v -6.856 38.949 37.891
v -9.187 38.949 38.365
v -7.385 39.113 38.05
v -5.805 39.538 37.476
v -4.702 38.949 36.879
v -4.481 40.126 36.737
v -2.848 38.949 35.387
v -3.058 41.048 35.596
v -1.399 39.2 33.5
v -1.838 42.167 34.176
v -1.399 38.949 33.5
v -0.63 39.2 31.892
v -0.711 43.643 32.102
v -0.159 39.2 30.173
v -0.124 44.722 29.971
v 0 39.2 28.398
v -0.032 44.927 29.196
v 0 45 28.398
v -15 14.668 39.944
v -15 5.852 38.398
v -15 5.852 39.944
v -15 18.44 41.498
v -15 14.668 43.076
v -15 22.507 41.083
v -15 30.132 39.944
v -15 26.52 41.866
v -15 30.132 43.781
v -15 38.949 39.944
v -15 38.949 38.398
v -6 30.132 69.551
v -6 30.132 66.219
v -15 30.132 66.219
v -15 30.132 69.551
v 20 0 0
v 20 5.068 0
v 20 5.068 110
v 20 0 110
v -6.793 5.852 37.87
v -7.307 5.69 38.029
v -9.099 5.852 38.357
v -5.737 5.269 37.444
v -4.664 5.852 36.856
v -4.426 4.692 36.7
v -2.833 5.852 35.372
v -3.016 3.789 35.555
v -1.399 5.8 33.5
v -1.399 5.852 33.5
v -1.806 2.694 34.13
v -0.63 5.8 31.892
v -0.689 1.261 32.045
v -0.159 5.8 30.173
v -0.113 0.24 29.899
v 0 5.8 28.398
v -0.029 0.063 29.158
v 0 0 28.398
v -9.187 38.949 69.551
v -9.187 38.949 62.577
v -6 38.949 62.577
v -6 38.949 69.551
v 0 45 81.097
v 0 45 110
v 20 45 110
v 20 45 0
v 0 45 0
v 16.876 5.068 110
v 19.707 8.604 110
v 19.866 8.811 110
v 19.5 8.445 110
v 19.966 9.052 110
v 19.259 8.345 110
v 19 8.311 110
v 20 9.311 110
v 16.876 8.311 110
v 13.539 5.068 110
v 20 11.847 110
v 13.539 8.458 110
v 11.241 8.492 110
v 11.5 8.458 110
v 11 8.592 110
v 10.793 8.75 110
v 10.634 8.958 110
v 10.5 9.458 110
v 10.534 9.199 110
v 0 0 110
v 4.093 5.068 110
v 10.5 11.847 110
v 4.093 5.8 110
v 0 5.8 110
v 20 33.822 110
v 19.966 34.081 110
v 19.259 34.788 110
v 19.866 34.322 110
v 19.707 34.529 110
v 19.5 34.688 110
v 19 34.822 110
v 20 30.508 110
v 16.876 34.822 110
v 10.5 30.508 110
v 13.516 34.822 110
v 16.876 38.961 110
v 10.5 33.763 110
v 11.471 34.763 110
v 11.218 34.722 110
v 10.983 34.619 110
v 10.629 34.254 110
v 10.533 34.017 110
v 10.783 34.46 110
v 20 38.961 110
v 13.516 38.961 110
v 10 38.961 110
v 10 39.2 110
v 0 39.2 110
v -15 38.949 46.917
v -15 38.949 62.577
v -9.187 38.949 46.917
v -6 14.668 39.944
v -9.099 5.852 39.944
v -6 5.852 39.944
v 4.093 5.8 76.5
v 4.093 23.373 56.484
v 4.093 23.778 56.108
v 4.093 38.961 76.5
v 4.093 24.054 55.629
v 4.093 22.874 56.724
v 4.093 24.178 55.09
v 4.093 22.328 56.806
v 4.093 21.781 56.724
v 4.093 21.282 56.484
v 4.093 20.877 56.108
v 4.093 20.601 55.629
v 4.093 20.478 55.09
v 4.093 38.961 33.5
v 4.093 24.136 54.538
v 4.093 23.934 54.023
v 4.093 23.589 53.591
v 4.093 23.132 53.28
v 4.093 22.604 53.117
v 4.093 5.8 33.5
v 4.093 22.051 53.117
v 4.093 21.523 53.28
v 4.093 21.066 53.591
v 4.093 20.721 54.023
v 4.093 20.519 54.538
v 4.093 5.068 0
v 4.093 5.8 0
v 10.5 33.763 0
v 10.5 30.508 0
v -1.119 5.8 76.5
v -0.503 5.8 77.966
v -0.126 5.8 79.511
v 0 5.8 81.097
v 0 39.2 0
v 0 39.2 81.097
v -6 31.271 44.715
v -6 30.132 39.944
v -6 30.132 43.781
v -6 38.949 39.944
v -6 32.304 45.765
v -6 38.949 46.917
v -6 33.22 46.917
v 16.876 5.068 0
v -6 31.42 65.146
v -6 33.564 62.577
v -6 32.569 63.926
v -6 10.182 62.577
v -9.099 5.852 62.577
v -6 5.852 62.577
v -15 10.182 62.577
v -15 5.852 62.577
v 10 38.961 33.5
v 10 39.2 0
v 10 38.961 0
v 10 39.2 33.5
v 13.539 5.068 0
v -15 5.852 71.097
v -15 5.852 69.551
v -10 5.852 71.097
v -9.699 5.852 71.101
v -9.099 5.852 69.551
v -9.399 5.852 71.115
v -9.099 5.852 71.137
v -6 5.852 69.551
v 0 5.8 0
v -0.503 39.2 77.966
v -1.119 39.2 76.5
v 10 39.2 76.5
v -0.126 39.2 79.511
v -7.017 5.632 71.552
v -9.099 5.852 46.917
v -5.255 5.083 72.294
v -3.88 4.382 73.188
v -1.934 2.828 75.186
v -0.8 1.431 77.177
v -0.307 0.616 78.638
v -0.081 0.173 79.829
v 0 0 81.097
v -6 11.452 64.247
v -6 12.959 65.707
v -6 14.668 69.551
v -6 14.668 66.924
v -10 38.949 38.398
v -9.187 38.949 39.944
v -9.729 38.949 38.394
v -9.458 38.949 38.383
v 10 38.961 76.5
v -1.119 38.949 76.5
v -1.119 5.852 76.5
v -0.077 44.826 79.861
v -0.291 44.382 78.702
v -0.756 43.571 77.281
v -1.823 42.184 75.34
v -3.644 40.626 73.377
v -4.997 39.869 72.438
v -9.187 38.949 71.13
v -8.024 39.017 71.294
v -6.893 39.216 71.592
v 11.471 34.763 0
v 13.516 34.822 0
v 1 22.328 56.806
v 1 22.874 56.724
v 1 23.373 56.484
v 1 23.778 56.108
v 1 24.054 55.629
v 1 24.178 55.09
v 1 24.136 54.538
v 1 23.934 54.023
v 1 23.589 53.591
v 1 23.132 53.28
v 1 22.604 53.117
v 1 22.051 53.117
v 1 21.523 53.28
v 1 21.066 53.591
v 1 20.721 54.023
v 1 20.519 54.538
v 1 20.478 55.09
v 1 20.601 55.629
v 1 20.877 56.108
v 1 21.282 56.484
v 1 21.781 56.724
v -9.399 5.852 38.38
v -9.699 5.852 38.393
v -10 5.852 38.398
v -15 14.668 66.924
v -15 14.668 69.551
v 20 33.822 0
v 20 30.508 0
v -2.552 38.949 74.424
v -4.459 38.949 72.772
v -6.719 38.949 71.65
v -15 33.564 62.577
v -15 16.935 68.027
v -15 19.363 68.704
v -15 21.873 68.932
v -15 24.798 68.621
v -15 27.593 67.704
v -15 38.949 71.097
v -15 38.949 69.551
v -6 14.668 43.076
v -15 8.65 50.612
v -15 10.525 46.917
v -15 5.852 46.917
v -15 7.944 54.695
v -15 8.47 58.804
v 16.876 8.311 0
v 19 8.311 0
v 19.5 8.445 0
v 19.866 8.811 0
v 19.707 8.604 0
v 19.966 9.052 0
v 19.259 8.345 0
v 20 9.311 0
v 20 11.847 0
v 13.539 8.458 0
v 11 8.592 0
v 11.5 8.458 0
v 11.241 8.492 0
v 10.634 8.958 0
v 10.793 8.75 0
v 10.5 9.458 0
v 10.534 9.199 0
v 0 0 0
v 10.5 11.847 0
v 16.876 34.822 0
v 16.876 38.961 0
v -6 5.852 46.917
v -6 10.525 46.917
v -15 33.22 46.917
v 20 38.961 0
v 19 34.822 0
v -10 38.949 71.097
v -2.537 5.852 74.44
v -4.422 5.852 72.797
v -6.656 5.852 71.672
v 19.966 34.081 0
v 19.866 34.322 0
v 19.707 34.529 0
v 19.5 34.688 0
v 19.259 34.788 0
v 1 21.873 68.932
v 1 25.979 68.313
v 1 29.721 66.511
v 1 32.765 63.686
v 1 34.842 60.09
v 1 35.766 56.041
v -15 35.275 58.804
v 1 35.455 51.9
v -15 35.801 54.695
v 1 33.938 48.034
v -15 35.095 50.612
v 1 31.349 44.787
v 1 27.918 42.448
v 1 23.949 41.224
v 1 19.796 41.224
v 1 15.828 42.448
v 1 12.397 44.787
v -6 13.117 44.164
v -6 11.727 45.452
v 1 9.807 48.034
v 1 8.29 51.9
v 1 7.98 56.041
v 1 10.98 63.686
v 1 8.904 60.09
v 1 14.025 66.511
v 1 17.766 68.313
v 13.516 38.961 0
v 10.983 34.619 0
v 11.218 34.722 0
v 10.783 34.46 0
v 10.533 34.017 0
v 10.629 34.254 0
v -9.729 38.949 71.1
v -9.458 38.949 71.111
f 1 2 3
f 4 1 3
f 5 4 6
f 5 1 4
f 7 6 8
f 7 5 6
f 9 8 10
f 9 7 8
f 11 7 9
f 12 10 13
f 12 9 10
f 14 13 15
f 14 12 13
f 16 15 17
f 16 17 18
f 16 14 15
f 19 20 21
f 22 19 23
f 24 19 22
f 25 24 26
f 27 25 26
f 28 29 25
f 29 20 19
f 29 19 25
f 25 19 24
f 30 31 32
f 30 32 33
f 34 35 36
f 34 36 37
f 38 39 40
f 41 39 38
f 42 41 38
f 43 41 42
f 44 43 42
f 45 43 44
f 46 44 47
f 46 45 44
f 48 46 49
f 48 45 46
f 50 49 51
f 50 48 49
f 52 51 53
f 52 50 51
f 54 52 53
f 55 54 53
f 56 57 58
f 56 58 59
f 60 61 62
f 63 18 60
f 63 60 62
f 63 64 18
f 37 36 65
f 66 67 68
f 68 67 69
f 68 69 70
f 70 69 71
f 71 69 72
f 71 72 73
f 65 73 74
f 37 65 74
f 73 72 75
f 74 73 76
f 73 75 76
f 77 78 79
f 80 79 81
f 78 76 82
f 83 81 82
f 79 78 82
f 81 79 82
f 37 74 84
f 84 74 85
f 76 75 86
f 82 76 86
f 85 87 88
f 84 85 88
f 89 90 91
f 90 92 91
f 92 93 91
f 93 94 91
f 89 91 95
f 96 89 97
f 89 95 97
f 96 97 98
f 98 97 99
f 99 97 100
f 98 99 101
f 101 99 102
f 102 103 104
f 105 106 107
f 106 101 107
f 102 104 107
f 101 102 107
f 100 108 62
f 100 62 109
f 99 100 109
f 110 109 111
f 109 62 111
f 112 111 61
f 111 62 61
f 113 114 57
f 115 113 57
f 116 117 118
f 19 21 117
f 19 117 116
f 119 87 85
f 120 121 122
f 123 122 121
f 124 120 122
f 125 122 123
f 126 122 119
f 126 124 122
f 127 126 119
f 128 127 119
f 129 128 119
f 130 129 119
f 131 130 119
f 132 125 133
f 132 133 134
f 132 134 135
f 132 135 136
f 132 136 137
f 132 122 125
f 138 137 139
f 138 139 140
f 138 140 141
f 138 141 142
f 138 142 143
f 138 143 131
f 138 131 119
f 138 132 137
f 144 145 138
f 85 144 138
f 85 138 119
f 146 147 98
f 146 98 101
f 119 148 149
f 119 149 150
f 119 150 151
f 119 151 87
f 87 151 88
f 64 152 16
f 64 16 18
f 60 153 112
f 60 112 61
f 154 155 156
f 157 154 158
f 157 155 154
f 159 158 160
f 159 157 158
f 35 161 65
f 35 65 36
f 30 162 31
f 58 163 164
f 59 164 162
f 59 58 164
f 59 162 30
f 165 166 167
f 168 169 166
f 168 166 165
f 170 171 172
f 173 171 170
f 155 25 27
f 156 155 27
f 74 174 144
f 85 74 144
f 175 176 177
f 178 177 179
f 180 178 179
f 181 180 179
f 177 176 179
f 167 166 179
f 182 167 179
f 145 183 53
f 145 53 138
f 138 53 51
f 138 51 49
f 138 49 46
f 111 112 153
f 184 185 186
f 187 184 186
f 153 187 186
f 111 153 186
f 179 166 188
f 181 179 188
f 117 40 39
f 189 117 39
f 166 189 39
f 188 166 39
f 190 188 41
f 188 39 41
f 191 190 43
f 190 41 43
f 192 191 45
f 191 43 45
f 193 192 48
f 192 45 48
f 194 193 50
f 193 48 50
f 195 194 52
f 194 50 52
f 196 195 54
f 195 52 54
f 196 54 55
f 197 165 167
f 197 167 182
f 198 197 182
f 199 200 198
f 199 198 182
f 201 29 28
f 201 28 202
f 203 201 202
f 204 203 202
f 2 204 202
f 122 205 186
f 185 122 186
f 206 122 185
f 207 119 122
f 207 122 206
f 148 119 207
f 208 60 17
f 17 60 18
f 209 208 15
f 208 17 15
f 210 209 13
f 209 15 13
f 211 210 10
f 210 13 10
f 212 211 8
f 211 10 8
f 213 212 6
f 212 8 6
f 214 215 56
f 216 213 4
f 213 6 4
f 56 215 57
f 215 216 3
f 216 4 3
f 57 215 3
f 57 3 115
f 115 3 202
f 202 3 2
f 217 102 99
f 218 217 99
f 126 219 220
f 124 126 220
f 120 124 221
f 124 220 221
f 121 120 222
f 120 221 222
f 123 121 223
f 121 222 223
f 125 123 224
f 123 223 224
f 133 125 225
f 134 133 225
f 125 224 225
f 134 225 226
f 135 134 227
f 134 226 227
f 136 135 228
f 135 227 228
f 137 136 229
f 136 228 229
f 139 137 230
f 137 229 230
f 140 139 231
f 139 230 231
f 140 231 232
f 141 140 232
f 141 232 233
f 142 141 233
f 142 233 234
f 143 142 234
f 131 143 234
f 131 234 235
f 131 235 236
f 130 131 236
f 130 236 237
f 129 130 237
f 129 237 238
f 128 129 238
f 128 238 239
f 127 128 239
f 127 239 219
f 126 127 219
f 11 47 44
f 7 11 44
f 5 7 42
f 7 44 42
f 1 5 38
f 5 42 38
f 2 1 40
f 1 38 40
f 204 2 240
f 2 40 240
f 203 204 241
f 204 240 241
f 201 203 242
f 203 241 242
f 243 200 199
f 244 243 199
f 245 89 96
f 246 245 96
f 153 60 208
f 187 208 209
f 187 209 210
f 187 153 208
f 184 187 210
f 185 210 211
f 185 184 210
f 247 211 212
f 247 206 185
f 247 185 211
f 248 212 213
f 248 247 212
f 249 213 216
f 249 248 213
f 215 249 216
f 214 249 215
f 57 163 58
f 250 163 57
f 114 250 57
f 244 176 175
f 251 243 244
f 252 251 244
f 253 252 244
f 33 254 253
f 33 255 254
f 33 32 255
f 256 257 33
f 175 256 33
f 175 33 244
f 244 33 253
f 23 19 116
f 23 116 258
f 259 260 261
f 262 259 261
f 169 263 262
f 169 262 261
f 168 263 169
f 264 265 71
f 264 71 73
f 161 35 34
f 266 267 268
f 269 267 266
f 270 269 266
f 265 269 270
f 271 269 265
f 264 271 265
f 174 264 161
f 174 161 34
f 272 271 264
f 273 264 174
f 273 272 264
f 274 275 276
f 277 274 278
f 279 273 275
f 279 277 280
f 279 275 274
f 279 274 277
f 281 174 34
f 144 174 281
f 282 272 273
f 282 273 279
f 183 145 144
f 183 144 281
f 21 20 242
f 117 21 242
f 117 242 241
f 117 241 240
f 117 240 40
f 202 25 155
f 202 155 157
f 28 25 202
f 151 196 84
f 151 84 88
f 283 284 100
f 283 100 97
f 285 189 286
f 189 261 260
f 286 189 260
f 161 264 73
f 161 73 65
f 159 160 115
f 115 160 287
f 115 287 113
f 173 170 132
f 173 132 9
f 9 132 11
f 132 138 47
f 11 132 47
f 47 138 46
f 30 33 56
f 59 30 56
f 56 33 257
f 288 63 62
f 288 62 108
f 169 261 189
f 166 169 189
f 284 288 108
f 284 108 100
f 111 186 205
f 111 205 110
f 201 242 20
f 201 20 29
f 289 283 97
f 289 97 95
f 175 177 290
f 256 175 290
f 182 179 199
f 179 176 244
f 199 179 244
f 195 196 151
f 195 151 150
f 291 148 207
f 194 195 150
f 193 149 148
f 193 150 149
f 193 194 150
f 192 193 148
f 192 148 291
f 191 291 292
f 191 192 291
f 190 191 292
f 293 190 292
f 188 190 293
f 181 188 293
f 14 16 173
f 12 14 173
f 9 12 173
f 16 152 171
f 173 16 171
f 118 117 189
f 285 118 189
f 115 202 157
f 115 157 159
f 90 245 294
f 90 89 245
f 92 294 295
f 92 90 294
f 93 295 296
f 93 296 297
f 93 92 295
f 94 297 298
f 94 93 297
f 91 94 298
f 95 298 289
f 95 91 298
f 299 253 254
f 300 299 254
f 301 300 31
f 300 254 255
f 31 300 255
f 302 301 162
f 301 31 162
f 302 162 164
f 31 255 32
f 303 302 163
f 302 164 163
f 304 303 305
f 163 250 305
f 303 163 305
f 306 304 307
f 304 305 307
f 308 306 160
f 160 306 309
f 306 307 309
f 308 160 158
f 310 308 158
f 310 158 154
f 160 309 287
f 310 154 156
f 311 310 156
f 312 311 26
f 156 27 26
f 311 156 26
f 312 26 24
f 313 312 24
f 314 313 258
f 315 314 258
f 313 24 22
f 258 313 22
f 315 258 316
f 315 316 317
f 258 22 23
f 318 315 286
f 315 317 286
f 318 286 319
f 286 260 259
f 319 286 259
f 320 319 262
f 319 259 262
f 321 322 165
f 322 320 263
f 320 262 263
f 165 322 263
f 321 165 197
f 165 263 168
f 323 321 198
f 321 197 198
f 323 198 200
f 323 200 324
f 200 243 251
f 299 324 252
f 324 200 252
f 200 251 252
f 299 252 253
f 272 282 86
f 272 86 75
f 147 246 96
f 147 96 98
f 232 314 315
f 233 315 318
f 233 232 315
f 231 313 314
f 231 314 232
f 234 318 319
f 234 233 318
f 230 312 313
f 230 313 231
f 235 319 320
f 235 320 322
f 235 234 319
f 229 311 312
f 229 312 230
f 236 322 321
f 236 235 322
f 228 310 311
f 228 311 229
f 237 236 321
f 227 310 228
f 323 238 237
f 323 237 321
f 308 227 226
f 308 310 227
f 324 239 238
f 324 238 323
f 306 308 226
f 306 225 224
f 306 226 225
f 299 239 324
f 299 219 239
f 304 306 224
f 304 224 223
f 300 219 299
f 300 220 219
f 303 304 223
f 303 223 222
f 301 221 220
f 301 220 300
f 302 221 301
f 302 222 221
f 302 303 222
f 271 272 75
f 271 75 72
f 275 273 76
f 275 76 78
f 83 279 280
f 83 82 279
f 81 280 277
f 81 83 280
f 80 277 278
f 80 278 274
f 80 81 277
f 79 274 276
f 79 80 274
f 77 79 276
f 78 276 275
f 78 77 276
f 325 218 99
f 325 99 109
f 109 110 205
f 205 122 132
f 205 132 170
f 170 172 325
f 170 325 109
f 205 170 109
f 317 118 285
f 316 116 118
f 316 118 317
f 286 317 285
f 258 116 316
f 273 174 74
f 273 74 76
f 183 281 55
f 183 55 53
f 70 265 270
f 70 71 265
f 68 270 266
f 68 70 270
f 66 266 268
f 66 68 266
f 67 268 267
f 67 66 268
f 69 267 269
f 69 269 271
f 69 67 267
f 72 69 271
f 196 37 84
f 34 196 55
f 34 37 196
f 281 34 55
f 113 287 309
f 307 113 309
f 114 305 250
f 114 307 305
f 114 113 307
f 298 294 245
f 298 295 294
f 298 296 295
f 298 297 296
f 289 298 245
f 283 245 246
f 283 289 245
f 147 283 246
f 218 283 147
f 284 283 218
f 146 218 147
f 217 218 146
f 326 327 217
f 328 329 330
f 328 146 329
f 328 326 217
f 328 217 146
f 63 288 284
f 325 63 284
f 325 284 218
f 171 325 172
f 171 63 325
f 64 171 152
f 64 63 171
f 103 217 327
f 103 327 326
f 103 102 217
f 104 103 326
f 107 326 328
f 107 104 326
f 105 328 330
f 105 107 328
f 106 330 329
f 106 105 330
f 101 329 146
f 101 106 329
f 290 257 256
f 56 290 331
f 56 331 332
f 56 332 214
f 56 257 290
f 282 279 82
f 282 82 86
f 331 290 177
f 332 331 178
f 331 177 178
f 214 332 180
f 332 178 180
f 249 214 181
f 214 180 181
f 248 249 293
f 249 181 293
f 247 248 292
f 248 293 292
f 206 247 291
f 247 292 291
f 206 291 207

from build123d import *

# Parameters (mm, degrees)
BOSS_EXTRUDE1_DEPTH = 110
SKETCH2_W           = 33.5
SKETCH2_H           = 33.4
CUT_EXTRUDE1_DEPTH  = 10
SKETCH3_R           = 1.855174256
CUT_EXTRUDE3_DEPTH  = 10
SKETCH5_W           = 32.698767502
SKETCH5_H           = 33.097532959
BOSS_EXTRUDE2_DEPTH = 15
FILLET1_START       = 28.397979731
FILLET1_DEPTH       = 52.698767702
FILLET1_START_2     = -6.3183e-05
FILLET1_2_DEPTH     = 45.00011208
FILLET1_START_3     = 5.8
FILLET1_3_DEPTH     = 33.4
FILLET1_START_4     = 5.851542156
FILLET1_4_DEPTH     = 33.097532959
SKETCH6_R           = 13.931881445
CUT_EXTRUDE5_DEPTH  = 16
FILLET7_R           = 1
FILLET8_R           = 1
SKETCH8_W           = 6.973836054
SKETCH8_H           = 8.816669347
CUT_EXTRUDE6_DEPTH  = 9


with BuildPart() as part:
    # Sketch1 → Boss-Extrude1 (new body)
    with BuildSketch(Plane.XY):
        Polygon((0, 0), (0, 45), (20, 45), (20, 38.960548223), (16.876367343, 38.960548223), (16.876367343, 34.822386524), (20, 34.822386524), (20, 30.507676941), (10.5, 30.507676941), (10.5, 34.734112582), (13.516445061, 34.822386524), (13.516445061, 38.960548223), (10.5, 38.960548223), (4.092986166, 38.960548223), (4.092986166, 5.068373594), (10.5, 5.068373594), (13.538820233, 5.068373594), (13.538820233, 8.457591057), (10.5, 8.457591057), (10.5, 11.84680852), (20, 11.84680852), (20, 8.310671744), (16.876367343, 8.310671744), (16.876367343, 5.068373594), (20, 5.068373594), (20, 0), align=None)
    extrude(amount=BOSS_EXTRUDE1_DEPTH)

    # Sketch2 → Cut-Extrude1 (cut)
    with BuildSketch(Plane.ZY):
        with Locations((93.25, 22.5)):
            Rectangle(SKETCH2_W, SKETCH2_H)
        with Locations((16.75, 22.5)):
            Rectangle(SKETCH2_W, SKETCH2_H)
    extrude(amount=-CUT_EXTRUDE1_DEPTH, mode=Mode.SUBTRACT)

    # Sketch3 → Cut-Extrude3 (cut)
    with BuildSketch(Plane.ZY):
        with Locations((54.95102213, 22.327543377)):
            Circle(SKETCH3_R)
    extrude(amount=-CUT_EXTRUDE3_DEPTH, mode=Mode.SUBTRACT)

    # Sketch5 → Boss-Extrude2 (add)
    with BuildSketch(Plane.ZY):
        with Locations((54.747363582, 22.400308636)):
            Rectangle(SKETCH5_W, SKETCH5_H)
    extrude(amount=BOSS_EXTRUDE2_DEPTH)

    # Fillet1: read off the stored shape, not the designer's step
    # Fillet1 outline → Fillet1 (add)
    with BuildSketch(Plane.XY.offset(FILLET1_START)):
        with BuildLine():
            Line((0, 39.2), (2.35e-05, 45.000054671))
            ThreePointArc((2.35e-05, 45.000054671), (-3.686763576, 40.597721798), (-9.187208811, 38.949075115))
            Line((-9.187208811, 38.949075115), (0, 38.949075115))
            Line((0, 38.949075115), (0, 39.2))
        make_face()
        with BuildLine():
            Line((2.8807e-05, -6.3183e-05), (0, 5.851542156))
            Line((0, 5.851542156), (-9.098917382, 5.851542156))
            ThreePointArc((-9.098917382, 5.851542156), (-3.689848451, 4.262366926), (2.8807e-05, -6.3183e-05))
        make_face()
    extrude(amount=FILLET1_DEPTH)

    # Fillet1 2 outline → Fillet1 2 (cut)
    with BuildSketch(Plane(origin=(0, 0, 0), x_dir=(1, 0, 0), z_dir=(0, 1, 0)).offset(FILLET1_START_2)):
        with BuildLine():
            Line((-12, -28.397979731), (-12, -38.397979831))
            Line((-12, -38.397979831), (-10, -38.397979831))
            ThreePointArc((-10, -38.397979831), (-2.928932158, -35.469047613), (0, -28.397979745))
            Line((0, -28.397979745), (-12, -28.397979731))
        make_face()
        with BuildLine():
            Line((-10, -71.096747333), (-12, -71.096747333))
            Line((-12, -71.096747333), (-12, -81.096747433))
            Line((-12, -81.096747433), (0, -81.096747419))
            ThreePointArc((0, -81.096747419), (-2.928932158, -74.025679551), (-10, -71.096747333))
        make_face()
    extrude(amount=FILLET1_2_DEPTH, mode=Mode.SUBTRACT)

    # Fillet1 3 outline → Fillet1 3 (cut)
    with BuildSketch(Plane(origin=(0, 0, 0), x_dir=(1, 0, 0), z_dir=(0, 1, 0)).offset(FILLET1_START_3)):
        with BuildLine():
            Line((-1.399454076, -33.5), (0, -33.5))
            Line((0, -33.5), (0, -28.397979831))
            ThreePointArc((0, -28.397979831), (-0.356207716, -31.043215242), (-1.399454076, -33.5))
        make_face()
        with BuildLine():
            Line((0, -81.096747333), (0, -76.5))
            Line((0, -76.5), (-1.119126509, -76.5))
            ThreePointArc((-1.119126509, -76.5), (-0.283809005, -78.731238393), (0, -81.096747333))
        make_face()
    extrude(amount=FILLET1_3_DEPTH, mode=Mode.SUBTRACT)

    # Fillet1 4 outline → Fillet1 4 (add)
    with BuildSketch(Plane(origin=(0, 0, 0), x_dir=(1, 0, 0), z_dir=(0, 1, 0)).offset(FILLET1_START_4)):
        with BuildLine():
            Line((0, -38.397979831), (0, -33.5))
            Line((0, -33.5), (-1.399454076, -33.5))
            ThreePointArc((-1.399454076, -33.5), (-5.051272976, -37.087634649), (-10, -38.397979831))
            Line((-10, -38.397979831), (0, -38.397979831))
        make_face()
        with BuildLine():
            Line((-1.119126509, -76.5), (0, -76.5))
            Line((0, -76.5), (0, -71.096747333))
            Line((0, -71.096747333), (-10, -71.096747333))
            ThreePointArc((-10, -71.096747333), (-4.802282873, -72.55369538), (-1.119126509, -76.5))
        make_face()
    extrude(amount=FILLET1_4_DEPTH)

    # Sketch6 → Cut-Extrude5 (cut)
    with BuildSketch(Plane.ZY.offset(15)):
        with Locations((55, 21.872686564)):
            Circle(SKETCH6_R)
    extrude(amount=-CUT_EXTRUDE5_DEPTH, mode=Mode.SUBTRACT)

    # Fillet7
    fillet7_edges = [part.edges().sort_by_distance(p)[0] for p in [
        (20, 34.822386524, 55),
        (10.5, 34.734112582, 55),
    ]]
    fillet(fillet7_edges, radius=FILLET7_R)

    # Fillet8
    fillet8_edges = [part.edges().sort_by_distance(p)[0] for p in [
        (10.5, 8.457591057, 55),
        (20, 8.310671744, 55),
    ]]
    fillet(fillet8_edges, radius=FILLET8_R)

    # Sketch8 → Cut-Extrude6 (cut)
    with BuildSketch(Plane.ZY.offset(15)):
        with Locations((66.064245808, 34.540740441)):
            Rectangle(SKETCH8_W, SKETCH8_H)
        with Locations((43.430481356, 34.540740441)):
            Rectangle(SKETCH8_W, SKETCH8_H)
        with Locations((66.064245808, 10.25987683)):
            Rectangle(SKETCH8_W, SKETCH8_H)
        with Locations((43.430481356, 10.25987683)):
            Rectangle(SKETCH8_W, SKETCH8_H)
    extrude(amount=-CUT_EXTRUDE6_DEPTH, mode=Mode.SUBTRACT)


solid = part.part
